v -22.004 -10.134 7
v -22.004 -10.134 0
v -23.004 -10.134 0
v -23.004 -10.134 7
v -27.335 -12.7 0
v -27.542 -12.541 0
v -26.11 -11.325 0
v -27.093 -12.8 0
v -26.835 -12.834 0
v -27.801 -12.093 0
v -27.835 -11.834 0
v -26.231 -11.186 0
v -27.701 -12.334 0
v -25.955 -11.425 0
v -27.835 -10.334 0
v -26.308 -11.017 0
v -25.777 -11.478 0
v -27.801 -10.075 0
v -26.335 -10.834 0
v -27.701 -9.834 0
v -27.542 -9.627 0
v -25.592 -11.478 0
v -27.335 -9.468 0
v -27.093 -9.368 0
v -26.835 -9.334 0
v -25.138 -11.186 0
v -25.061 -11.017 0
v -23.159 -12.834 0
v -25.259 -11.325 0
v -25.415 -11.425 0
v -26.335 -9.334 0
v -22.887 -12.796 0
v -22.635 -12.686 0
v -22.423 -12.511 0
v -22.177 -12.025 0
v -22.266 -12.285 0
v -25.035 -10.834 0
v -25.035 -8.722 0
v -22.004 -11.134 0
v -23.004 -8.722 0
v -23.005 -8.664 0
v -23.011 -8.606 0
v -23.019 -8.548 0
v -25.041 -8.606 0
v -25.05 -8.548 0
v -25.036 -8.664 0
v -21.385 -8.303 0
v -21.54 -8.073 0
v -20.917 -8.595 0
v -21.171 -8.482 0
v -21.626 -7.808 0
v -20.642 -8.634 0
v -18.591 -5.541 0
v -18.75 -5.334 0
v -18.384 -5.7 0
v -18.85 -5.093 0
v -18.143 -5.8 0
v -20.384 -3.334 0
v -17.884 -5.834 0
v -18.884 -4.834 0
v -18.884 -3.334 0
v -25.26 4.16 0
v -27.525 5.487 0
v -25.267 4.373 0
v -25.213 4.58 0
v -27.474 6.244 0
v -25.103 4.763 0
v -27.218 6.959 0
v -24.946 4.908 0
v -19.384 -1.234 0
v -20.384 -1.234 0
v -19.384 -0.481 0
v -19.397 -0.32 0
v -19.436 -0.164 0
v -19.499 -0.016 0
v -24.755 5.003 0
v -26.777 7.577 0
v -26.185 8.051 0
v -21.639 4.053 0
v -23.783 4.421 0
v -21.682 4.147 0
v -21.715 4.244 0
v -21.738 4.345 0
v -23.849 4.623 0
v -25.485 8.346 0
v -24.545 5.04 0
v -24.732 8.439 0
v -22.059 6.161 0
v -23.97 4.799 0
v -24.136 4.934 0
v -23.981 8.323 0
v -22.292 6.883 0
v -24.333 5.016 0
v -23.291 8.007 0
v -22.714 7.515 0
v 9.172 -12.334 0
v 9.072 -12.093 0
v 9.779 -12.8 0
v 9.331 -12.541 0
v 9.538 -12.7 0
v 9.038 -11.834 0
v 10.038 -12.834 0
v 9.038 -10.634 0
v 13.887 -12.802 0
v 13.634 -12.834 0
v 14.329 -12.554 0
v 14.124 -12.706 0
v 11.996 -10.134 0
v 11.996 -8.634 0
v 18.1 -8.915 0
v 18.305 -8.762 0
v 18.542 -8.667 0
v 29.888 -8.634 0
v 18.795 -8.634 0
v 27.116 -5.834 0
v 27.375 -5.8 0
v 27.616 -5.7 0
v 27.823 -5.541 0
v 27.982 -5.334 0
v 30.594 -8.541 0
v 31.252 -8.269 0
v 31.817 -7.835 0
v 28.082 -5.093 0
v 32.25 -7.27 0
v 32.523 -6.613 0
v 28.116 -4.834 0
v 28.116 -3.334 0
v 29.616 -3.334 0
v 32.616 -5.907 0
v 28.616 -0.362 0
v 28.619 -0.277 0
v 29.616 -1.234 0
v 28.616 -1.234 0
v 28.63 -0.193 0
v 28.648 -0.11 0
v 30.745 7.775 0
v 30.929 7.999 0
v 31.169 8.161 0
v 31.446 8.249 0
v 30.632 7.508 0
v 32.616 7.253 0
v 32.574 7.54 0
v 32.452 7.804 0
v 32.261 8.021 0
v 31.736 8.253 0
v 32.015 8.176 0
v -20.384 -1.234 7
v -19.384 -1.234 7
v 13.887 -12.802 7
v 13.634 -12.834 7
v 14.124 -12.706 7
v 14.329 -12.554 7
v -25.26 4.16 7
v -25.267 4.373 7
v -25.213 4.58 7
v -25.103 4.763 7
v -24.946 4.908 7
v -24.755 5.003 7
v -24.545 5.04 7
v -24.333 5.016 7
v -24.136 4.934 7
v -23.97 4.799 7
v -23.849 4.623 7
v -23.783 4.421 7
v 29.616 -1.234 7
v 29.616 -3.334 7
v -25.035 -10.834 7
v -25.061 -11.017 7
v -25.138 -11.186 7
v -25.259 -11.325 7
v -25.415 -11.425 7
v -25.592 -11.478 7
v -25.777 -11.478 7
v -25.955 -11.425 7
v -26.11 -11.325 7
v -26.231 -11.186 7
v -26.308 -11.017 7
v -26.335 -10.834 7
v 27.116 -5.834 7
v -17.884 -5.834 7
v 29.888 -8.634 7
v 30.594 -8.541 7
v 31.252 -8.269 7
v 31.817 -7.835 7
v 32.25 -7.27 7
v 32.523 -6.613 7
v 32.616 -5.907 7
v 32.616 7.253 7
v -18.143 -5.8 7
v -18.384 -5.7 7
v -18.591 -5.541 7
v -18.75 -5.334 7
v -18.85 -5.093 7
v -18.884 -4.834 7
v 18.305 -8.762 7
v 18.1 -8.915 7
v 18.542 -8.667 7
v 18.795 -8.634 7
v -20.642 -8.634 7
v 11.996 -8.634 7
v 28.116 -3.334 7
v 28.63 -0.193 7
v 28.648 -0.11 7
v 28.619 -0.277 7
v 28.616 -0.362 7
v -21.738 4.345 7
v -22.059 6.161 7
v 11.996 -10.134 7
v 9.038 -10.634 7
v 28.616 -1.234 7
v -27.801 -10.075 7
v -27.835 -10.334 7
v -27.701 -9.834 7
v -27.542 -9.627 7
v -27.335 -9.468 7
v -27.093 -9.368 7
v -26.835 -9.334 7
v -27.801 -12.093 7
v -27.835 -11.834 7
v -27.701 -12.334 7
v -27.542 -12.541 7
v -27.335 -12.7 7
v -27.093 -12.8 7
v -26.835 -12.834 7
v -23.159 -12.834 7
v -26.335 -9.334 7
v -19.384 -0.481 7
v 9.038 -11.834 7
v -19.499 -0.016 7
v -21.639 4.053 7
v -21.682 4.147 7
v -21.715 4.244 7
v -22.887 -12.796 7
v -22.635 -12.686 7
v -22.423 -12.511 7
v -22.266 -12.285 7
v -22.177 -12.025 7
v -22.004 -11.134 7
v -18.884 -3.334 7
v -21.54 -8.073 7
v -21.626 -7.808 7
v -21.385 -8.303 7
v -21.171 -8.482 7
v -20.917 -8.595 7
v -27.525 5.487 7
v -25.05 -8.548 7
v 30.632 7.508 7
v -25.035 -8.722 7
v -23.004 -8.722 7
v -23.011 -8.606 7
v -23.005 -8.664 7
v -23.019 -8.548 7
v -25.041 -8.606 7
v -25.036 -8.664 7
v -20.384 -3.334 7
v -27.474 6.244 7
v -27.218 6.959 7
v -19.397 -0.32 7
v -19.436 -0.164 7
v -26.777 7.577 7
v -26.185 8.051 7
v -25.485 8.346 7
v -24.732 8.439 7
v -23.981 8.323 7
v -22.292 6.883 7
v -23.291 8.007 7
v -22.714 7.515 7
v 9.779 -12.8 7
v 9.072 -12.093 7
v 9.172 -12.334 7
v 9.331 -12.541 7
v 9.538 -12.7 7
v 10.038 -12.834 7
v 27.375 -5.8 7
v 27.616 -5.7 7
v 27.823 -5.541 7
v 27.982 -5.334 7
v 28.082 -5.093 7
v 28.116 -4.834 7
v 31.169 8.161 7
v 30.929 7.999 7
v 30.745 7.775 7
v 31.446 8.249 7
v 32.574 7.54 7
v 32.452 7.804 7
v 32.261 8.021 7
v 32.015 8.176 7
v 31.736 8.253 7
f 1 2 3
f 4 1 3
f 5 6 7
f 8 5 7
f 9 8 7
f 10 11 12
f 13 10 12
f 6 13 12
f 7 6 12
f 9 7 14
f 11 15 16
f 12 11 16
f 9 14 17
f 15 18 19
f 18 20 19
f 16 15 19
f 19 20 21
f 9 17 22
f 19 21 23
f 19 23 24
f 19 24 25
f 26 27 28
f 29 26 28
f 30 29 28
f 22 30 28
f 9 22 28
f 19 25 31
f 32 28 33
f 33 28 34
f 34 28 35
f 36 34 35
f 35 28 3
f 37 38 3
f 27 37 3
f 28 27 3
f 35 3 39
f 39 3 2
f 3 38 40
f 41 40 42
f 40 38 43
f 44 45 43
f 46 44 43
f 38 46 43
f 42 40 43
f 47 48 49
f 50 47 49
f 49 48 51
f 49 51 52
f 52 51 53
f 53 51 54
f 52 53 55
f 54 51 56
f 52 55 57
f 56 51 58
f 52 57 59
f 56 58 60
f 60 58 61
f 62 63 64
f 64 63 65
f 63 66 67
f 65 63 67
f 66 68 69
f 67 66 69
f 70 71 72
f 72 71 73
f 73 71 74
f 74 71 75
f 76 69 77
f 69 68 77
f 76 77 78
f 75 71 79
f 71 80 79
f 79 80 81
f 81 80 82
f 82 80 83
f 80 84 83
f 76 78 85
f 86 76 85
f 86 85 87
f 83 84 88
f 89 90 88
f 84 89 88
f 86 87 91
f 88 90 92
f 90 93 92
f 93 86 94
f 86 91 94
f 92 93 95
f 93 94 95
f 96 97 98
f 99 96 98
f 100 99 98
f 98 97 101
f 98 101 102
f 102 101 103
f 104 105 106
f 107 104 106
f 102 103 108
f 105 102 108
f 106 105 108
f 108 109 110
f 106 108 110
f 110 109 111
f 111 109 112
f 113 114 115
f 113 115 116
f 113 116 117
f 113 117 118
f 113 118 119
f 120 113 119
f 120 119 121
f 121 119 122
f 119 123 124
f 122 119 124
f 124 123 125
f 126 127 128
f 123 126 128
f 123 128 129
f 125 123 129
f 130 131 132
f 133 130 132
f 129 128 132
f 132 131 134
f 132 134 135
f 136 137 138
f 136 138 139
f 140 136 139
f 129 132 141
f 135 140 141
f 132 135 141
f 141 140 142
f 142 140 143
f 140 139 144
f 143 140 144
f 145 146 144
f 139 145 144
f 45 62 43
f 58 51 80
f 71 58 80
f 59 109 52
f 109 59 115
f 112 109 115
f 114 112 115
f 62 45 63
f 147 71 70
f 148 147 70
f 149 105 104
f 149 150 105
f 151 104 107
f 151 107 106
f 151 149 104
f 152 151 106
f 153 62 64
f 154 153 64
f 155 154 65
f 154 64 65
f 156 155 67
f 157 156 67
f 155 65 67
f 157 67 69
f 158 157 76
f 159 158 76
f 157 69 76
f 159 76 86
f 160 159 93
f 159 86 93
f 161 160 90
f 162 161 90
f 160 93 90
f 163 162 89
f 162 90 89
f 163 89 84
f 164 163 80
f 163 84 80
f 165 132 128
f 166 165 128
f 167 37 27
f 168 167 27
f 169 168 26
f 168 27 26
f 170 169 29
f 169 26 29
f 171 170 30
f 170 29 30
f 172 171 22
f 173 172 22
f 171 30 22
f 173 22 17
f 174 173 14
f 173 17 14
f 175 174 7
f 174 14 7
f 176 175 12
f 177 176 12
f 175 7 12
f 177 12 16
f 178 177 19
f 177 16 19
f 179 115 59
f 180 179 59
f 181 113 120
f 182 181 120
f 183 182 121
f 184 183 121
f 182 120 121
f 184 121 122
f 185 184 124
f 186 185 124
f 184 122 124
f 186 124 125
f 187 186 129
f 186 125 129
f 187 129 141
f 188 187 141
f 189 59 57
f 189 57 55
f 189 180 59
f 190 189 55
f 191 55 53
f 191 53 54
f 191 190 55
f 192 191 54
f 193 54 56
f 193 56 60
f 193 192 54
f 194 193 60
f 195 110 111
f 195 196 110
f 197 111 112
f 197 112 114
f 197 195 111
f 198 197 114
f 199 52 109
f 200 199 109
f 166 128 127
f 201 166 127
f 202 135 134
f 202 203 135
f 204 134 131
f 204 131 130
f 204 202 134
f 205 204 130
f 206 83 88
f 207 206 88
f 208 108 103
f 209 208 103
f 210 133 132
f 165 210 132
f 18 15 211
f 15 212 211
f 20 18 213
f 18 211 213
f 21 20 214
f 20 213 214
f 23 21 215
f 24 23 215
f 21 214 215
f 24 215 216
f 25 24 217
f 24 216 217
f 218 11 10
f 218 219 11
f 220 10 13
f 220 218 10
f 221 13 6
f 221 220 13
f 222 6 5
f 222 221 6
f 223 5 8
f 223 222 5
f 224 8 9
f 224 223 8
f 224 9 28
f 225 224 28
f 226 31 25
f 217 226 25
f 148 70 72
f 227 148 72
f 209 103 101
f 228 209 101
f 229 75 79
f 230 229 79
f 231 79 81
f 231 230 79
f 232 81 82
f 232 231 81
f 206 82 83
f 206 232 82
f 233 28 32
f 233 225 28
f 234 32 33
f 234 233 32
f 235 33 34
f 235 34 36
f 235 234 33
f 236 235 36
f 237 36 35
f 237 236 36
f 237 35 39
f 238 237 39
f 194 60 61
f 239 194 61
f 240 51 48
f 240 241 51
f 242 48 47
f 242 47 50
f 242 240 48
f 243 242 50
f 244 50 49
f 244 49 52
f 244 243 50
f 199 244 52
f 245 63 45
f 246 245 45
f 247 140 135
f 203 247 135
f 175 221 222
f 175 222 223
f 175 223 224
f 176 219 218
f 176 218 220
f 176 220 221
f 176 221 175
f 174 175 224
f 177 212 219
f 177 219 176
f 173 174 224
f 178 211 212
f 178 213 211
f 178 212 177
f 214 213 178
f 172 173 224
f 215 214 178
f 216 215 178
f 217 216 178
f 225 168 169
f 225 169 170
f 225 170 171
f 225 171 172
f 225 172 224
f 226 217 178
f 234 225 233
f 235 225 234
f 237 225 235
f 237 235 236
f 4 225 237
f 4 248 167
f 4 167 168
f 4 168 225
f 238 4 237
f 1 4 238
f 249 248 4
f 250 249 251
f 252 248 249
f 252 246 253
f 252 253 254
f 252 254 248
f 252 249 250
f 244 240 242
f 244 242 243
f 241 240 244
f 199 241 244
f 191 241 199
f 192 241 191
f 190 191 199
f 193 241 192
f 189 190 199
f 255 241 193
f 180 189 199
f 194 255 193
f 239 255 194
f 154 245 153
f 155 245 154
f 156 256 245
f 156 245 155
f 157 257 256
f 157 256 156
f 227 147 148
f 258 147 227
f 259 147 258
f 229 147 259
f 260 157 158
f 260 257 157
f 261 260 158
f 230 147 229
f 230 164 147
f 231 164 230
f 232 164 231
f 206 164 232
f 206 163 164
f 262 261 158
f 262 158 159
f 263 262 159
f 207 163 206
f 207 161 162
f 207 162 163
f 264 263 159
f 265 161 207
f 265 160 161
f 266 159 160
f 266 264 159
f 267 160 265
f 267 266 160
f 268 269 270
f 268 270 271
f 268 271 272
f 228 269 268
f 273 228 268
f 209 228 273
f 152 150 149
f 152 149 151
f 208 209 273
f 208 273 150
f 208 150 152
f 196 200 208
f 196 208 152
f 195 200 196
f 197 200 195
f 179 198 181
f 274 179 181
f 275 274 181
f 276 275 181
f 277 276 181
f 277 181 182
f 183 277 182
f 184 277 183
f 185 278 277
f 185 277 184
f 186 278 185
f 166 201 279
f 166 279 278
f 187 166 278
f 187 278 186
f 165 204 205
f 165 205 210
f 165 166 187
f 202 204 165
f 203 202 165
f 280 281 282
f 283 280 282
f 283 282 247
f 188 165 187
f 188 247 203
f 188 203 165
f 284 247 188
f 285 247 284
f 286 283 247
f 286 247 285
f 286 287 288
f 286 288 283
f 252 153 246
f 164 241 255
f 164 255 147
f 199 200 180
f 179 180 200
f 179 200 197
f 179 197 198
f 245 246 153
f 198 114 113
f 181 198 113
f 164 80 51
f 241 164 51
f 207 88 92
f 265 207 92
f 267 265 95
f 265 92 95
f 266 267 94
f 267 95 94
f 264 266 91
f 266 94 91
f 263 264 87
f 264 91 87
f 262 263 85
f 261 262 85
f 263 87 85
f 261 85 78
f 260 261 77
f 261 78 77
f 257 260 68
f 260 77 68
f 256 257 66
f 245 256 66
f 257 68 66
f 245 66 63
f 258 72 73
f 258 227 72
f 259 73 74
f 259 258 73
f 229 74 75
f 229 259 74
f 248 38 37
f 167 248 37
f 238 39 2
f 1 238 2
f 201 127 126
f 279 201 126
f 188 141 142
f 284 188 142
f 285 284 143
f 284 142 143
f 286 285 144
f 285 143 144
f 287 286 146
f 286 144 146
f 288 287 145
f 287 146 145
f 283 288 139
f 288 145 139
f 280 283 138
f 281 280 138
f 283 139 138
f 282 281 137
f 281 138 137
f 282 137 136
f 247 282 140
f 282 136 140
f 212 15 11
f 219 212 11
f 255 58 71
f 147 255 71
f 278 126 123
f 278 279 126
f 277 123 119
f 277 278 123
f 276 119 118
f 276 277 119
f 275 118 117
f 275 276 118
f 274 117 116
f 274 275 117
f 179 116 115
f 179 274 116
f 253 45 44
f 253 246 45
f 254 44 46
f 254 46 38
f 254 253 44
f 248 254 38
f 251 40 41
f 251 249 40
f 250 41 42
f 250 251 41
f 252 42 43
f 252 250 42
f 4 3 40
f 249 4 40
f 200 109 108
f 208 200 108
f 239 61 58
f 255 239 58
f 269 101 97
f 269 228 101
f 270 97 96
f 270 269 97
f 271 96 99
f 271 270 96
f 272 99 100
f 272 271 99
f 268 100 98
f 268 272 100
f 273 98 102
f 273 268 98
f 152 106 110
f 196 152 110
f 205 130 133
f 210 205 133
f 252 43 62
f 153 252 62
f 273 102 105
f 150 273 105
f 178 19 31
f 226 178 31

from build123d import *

# Parameters (mm, degrees)
F1_DEPTH = 7
F2_R     = 1


with BuildPart() as f1:
    # F0 (on Top) → F1 (new body)
    with BuildSketch(Plane.XY):
        with BuildLine():
            Line((-27.834629, -9.334226), (-27.834629, -12.834226))
            Line((-27.834629, -12.834226), (-22.334629, -12.834226))
            Line((-22.334629, -12.834226), (-22.003776, -11.134226))
            Line((-22.003776, -11.134226), (-22.003776, -10.134226))
            Line((-22.003776, -10.134226), (-23.003776, -10.134226))
            Line((-23.003776, -10.134226), (-23.003776, -8.634226))
            Line((-23.003776, -8.634226), (-25.259763, 4.160111))
            ThreePointArc((-25.259763, 4.160111), (-24.651393, 5.028953), (-23.782551, 4.420584))
            Line((-23.782551, 4.420584), (-21.480636, -8.634226))
            Line((-21.480636, -8.634226), (11.996224, -8.634226))
            Line((11.996224, -8.634226), (11.996224, -10.134226))
            Line((11.996224, -10.134226), (9.038184, -10.634226))
            Line((9.038184, -10.634226), (9.038184, -12.834226))
            Line((9.038184, -12.834226), (14.038184, -12.834226))
            Line((14.038184, -12.834226), (18.390972, -8.634226))
            Line((18.390972, -8.634226), (29.887993, -8.634226))
            ThreePointArc((29.887993, -8.634226), (31.816762, -7.835304), (32.615684, -5.906535))
            Line((32.615684, -5.906535), (32.615684, 7.253453))
            ThreePointArc((32.615684, 7.253453), (31.735595, 8.253453), (30.631889, 7.507538))
            Line((30.631889, 7.507538), (28.615684, -0.234227))
            Line((28.615684, -0.234227), (28.615684, -1.234227))
            Line((28.615684, -1.234227), (29.615684, -1.234227))
            Line((29.615684, -1.234227), (29.615684, -3.334226))
            Line((29.615684, -3.334226), (28.115683, -3.334226))
            Line((28.115683, -3.334226), (28.115683, -5.834226))
            Line((28.115683, -5.834226), (18.390972, -5.834226))
            Line((18.390972, -5.834226), (-18.884315, -5.834226))
            Line((-18.884315, -5.834226), (-18.884315, -3.334226))
            Line((-18.884315, -3.334226), (-20.384316, -3.334226))
            Line((-20.384316, -3.334226), (-20.384316, -1.234227))
            Line((-20.384316, -1.234227), (-19.384316, -1.234227))
            Line((-19.384316, -1.234227), (-19.384316, -0.234227))
            Line((-19.384316, -0.234227), (-21.711269, 4.1913))
            Line((-21.711269, 4.1913), (-22.058566, 6.160916))
            ThreePointArc((-22.058566, 6.160916), (-25.111557, 8.41877), (-27.524558, 5.48686))
            Line((-27.524558, 5.48686), (-25.034629, -8.634226))
            Line((-25.034629, -8.634226), (-25.034629, -10.834226))
            ThreePointArc((-25.034629, -10.834226), (-25.684629, -11.484226), (-26.334629, -10.834226))
            Line((-26.334629, -10.834226), (-26.334629, -9.334226))
            Line((-26.334629, -9.334226), (-27.834629, -9.334226))
        make_face()
    extrude(amount=F1_DEPTH)

    # F2
    f2_edges = [f1.edges().sort_by_distance(p)[0] for p in [
        (14.038184, -12.834226, 3.5),
        (-27.834629, -12.834226, 3.5),
        (-22.334629, -12.834226, 3.5),
        (-25.034629, -8.634226, 3.5),
        (18.390972, -8.634226, 3.5),
        (9.038184, -12.834226, 3.5),
        (-21.711269, 4.1913, 3.5),
        (28.615684, -0.234227, 3.5),
        (-19.384316, -0.234227, 3.5),
        (-18.884315, -5.834226, 3.5),
        (-21.480636, -8.634226, 3.5),
        (28.115683, -5.834226, 3.5),
        (-23.003776, -8.634226, 3.5),
        (-27.834629, -9.334226, 3.5),
    ]]
    fillet(f2_edges, radius=F2_R)


solid = f1.part
